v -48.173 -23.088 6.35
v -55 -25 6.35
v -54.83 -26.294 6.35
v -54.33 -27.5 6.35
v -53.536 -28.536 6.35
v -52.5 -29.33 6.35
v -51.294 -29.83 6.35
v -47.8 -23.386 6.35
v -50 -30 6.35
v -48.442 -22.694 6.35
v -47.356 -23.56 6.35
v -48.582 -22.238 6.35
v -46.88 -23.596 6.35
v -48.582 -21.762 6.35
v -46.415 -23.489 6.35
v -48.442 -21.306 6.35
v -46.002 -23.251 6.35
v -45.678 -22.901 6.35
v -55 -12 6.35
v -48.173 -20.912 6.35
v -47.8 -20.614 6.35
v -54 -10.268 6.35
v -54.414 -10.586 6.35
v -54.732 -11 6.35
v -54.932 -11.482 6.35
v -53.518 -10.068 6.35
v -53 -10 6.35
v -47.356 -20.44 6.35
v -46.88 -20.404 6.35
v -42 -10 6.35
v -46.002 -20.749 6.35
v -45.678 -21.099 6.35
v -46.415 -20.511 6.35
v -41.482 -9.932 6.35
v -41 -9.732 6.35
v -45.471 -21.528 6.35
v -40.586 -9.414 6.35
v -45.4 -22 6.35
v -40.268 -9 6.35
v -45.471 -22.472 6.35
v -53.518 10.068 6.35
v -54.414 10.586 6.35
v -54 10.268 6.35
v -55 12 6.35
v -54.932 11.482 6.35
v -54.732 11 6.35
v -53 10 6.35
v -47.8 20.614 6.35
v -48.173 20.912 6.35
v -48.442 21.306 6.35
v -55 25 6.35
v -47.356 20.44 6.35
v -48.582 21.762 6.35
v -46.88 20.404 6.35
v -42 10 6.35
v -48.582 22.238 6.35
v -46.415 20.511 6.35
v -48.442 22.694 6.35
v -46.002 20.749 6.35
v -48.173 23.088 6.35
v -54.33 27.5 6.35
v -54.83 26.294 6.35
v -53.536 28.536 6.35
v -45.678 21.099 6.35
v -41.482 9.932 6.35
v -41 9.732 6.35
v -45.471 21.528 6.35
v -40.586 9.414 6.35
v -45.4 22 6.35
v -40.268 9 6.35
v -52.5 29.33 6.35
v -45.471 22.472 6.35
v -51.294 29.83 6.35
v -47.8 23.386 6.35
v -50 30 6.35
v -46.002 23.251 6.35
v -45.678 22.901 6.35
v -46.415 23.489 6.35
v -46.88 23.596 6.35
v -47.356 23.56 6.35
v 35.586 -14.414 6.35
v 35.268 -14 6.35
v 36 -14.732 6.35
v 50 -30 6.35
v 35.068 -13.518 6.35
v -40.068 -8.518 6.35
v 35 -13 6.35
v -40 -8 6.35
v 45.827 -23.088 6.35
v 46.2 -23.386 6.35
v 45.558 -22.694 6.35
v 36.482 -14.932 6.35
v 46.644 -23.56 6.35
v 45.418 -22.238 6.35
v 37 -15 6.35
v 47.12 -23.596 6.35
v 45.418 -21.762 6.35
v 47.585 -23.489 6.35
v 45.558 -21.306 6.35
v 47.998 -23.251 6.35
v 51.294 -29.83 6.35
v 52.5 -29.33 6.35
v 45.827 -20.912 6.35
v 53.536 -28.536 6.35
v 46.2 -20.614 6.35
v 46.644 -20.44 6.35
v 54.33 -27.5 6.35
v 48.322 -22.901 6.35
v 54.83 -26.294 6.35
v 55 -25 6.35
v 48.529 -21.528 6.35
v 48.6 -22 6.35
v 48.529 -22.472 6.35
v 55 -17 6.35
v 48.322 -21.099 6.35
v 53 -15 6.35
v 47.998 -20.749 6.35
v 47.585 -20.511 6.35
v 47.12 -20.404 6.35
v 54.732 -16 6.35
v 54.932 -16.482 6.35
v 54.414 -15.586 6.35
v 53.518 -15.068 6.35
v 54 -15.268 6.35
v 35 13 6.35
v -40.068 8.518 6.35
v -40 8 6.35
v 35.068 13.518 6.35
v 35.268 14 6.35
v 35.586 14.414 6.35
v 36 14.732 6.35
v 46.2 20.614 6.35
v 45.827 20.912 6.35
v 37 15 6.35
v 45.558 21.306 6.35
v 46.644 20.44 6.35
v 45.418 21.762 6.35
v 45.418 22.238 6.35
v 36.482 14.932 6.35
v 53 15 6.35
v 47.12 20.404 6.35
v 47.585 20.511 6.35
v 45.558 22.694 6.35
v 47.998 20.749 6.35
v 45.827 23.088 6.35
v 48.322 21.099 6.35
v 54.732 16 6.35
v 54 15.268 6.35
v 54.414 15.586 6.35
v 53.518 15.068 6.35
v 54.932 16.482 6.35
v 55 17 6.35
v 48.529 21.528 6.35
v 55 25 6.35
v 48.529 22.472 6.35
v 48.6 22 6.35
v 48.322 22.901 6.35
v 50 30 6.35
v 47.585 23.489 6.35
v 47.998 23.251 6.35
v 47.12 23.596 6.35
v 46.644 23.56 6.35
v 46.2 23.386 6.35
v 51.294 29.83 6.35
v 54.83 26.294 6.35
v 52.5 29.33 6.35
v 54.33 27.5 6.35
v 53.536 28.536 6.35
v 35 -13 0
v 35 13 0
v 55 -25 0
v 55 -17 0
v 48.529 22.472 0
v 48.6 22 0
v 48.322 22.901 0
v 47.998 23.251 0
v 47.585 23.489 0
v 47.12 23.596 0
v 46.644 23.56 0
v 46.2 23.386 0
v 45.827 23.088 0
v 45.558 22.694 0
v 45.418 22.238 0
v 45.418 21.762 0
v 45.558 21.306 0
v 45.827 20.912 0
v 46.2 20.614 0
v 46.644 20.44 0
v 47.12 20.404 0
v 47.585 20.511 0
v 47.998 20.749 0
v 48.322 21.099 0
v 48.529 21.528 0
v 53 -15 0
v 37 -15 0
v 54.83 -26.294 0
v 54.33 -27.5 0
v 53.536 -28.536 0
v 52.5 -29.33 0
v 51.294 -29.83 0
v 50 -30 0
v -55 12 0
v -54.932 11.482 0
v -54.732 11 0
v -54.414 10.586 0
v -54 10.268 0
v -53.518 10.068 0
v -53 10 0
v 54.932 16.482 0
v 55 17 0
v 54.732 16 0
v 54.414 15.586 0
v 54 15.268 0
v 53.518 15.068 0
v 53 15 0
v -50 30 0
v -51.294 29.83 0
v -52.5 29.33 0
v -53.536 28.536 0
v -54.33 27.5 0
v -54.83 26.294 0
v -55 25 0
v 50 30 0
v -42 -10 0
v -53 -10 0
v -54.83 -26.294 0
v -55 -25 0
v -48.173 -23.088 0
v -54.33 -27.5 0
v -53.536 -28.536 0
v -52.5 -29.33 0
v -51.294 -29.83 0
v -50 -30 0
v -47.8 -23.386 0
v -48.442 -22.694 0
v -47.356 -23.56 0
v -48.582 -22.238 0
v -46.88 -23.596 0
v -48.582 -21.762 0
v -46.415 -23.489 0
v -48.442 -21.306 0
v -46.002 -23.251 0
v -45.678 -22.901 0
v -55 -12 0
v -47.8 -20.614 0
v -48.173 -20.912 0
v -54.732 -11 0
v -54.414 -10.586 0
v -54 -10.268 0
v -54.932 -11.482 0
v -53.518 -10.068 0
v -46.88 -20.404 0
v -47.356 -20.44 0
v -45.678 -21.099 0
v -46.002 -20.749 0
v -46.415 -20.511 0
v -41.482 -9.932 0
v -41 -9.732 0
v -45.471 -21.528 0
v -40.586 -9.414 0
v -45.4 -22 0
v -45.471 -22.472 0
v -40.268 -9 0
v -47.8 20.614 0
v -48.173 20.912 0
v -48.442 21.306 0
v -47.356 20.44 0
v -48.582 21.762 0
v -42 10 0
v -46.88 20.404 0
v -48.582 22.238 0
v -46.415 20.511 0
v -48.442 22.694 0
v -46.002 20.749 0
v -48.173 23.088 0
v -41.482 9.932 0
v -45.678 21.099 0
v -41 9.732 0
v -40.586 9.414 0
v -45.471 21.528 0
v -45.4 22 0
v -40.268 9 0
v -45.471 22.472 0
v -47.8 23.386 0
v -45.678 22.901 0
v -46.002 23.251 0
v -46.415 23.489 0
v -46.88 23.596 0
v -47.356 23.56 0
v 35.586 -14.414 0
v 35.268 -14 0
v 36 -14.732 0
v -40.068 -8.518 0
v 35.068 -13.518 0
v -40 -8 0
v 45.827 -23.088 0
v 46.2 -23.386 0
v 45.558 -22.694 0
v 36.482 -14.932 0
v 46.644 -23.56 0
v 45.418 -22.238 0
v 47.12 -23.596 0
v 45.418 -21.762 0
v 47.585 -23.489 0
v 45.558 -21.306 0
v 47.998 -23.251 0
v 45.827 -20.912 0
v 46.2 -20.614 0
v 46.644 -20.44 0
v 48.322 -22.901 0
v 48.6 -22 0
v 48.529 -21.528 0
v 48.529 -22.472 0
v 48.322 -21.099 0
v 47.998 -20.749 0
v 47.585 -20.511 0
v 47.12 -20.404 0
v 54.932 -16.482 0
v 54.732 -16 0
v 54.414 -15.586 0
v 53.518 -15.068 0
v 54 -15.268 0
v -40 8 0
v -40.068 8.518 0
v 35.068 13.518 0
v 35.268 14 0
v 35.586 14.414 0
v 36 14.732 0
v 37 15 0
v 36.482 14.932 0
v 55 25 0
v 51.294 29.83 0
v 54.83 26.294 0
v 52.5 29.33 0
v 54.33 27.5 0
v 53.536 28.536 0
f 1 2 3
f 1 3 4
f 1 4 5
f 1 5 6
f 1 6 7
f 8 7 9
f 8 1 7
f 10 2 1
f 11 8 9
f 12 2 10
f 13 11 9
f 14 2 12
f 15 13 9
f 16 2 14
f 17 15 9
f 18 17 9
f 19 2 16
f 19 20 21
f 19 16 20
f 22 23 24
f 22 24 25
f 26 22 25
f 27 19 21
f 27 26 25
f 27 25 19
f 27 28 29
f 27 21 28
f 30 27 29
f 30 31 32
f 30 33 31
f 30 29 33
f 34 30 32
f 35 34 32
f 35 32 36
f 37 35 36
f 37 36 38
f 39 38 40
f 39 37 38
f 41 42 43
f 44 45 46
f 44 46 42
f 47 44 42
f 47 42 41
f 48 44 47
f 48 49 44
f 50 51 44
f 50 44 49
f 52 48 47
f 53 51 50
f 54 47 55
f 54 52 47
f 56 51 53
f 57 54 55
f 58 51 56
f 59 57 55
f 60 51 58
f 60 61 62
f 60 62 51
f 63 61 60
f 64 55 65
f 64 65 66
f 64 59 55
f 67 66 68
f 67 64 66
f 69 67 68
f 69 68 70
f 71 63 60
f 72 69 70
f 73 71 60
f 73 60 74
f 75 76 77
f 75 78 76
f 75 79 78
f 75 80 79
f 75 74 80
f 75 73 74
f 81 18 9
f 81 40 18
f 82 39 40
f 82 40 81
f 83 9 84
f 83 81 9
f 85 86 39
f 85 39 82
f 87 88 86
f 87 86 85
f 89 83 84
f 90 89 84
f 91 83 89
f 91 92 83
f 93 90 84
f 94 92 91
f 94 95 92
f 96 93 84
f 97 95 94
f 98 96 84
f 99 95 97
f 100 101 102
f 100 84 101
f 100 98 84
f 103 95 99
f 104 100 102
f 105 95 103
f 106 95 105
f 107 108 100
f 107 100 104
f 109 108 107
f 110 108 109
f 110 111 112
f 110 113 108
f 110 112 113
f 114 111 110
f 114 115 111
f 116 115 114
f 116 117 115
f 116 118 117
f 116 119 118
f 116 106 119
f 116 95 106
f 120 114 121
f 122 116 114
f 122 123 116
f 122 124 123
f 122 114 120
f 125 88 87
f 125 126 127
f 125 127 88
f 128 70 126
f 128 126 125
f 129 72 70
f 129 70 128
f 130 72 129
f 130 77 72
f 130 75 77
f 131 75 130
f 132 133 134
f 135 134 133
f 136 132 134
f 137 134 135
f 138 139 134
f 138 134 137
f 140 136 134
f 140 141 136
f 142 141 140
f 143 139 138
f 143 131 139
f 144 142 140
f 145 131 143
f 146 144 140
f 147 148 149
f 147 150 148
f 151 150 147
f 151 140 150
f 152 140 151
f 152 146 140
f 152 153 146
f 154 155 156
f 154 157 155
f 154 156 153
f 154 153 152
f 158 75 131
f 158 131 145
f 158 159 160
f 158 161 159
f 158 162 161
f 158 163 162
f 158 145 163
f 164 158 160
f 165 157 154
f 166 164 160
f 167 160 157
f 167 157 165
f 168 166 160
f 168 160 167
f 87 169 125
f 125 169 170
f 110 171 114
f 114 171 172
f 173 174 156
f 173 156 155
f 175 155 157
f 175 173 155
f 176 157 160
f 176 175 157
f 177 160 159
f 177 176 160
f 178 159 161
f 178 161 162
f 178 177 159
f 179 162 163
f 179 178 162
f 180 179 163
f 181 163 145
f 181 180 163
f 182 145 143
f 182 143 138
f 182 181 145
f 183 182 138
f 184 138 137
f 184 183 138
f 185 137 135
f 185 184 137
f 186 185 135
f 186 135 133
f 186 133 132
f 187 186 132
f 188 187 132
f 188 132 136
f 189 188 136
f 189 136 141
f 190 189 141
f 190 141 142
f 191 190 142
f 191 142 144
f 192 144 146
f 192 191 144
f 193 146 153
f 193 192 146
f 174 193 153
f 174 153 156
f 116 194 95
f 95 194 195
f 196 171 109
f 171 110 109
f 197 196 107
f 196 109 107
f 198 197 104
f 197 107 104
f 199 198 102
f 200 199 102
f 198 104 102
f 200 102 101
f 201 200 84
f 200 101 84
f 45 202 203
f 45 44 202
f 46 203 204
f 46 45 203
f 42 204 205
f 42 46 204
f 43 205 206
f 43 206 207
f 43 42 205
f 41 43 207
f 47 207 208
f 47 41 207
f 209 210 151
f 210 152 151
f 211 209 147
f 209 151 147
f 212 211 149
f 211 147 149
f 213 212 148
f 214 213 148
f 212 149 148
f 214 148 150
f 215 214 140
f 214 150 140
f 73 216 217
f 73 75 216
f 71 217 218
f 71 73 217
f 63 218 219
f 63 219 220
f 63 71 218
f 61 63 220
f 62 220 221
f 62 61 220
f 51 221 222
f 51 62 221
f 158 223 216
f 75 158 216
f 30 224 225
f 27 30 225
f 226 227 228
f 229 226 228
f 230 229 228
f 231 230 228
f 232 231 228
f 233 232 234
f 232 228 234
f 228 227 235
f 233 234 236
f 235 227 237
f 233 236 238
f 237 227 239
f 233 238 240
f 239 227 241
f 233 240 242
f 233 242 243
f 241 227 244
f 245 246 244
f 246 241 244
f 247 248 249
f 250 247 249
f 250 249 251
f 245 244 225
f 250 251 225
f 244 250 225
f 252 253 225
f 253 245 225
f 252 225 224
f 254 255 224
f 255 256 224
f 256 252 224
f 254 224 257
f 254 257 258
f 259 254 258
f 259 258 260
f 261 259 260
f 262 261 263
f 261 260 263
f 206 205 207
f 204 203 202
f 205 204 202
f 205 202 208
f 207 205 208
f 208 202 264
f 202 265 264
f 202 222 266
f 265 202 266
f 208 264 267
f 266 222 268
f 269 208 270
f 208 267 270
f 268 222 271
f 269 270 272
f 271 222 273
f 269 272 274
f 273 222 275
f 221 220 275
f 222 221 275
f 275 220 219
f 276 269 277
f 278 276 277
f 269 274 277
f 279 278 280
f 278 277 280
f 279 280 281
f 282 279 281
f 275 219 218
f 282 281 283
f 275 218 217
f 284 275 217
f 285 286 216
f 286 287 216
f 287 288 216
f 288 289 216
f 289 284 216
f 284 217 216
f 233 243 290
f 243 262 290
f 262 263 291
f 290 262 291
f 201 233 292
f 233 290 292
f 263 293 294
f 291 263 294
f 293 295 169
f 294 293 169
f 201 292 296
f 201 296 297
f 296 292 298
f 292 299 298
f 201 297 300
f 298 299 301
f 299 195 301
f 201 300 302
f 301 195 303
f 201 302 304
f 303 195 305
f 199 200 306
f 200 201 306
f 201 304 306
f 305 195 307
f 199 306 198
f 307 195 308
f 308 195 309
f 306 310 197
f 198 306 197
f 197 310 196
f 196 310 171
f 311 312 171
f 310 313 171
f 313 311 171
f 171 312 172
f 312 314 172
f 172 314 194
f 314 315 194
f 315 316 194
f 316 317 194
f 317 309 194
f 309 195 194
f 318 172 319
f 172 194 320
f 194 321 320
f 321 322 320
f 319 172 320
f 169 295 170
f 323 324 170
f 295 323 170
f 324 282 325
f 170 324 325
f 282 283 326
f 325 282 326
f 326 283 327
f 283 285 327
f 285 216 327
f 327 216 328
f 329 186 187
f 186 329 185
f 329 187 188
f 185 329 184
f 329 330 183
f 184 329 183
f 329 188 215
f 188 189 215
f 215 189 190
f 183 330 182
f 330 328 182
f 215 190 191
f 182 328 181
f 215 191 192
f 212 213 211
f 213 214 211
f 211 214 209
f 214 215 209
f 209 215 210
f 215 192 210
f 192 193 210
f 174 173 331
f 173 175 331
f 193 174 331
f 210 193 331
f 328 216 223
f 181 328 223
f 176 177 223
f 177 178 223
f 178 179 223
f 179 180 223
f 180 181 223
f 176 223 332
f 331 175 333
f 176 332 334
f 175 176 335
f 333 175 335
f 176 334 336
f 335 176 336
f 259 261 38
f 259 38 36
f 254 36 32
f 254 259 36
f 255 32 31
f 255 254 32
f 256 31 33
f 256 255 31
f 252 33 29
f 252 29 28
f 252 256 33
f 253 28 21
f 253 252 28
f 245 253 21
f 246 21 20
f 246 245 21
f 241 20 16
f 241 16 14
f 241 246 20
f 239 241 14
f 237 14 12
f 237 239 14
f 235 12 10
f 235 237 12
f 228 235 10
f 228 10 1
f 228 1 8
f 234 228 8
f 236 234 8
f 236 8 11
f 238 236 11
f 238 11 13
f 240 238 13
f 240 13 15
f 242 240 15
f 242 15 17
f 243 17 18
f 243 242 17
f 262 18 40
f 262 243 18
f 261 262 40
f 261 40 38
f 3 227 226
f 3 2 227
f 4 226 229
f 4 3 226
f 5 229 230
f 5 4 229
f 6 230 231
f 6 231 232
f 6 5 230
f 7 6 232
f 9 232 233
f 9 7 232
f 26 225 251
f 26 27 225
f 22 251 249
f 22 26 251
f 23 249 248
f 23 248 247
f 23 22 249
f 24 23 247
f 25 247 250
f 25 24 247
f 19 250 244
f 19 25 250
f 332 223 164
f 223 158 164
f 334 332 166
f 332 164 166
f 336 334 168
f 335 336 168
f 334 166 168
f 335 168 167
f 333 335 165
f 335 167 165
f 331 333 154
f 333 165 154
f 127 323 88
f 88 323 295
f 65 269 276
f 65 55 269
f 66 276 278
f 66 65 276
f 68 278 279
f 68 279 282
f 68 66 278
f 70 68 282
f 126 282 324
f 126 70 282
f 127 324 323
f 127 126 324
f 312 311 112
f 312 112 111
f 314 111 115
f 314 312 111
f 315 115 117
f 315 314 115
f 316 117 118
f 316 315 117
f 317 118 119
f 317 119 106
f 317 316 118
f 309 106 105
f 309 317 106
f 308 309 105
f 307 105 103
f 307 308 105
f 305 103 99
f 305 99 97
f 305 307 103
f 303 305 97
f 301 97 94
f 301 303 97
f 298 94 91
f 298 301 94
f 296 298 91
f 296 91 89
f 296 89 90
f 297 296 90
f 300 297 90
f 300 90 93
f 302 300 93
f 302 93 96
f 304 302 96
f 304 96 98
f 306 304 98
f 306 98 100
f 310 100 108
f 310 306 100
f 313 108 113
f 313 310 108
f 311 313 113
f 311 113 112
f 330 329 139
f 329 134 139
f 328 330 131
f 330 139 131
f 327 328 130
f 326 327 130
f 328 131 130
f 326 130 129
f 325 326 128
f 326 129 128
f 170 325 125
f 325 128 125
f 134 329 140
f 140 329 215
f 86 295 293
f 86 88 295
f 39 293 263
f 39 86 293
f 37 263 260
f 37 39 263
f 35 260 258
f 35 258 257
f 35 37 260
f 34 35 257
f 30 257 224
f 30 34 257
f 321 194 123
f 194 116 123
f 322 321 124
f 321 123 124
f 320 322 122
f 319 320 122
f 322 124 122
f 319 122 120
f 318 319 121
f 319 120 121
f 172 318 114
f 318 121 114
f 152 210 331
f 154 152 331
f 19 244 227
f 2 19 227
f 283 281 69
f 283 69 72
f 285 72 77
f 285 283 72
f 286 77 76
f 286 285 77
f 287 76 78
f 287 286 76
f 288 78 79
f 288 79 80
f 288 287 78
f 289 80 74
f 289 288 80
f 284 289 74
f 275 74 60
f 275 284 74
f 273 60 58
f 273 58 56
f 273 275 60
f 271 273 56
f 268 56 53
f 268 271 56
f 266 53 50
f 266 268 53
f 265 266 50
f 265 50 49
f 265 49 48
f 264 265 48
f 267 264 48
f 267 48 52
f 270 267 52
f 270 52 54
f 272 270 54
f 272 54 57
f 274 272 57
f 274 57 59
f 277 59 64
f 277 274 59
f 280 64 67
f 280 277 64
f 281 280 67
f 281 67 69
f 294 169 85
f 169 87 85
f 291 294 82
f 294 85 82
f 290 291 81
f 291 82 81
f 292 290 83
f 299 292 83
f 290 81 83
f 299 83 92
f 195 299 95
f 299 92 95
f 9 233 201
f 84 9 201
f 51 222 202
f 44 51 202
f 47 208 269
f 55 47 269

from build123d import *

# Parameters (mm, degrees)
F0_R     = 1.6
F1_DEPTH = 6.35
F2_R     = 5
F3_R     = 2


with BuildPart() as f1:
    # F0 (on Top) → F1 (new body)
    with BuildSketch(Plane.XY):
        Polygon((55, 30), (-55, 30), (-55, 10), (-40, 10), (-40, -10), (-55, -10), (-55, -30), (55, -30), (55, -15), (35, -15), (35, 15), (55, 15), align=None)
        with Locations((-47, -22)):
            Circle(F0_R, mode=Mode.SUBTRACT)
        with Locations((47, -22)):
            Circle(F0_R, mode=Mode.SUBTRACT)
        with Locations((-47, 22)):
            Circle(F0_R, mode=Mode.SUBTRACT)
        with Locations((47, 22)):
            Circle(F0_R, mode=Mode.SUBTRACT)
    extrude(amount=F1_DEPTH)

    # F2
    f2_edges = [f1.edges().sort_by_distance(p)[0] for p in [
        (-55, 30, 3.175),
        (55, 30, 3.175),
        (55, -30, 3.175),
        (-55, -30, 3.175),
    ]]
    fillet(f2_edges, radius=F2_R)

    # F3
    f3_edges = [f1.edges().sort_by_distance(p)[0] for p in [
        (-55, -10, 3.175),
        (-40, -10, 3.175),
        (-55, 10, 3.175),
        (-40, 10, 3.175),
        (35, -15, 3.175),
        (55, -15, 3.175),
        (55, 15, 3.175),
        (35, 15, 3.175),
    ]]
    fillet(f3_edges, radius=F3_R)


solid = f1.part
